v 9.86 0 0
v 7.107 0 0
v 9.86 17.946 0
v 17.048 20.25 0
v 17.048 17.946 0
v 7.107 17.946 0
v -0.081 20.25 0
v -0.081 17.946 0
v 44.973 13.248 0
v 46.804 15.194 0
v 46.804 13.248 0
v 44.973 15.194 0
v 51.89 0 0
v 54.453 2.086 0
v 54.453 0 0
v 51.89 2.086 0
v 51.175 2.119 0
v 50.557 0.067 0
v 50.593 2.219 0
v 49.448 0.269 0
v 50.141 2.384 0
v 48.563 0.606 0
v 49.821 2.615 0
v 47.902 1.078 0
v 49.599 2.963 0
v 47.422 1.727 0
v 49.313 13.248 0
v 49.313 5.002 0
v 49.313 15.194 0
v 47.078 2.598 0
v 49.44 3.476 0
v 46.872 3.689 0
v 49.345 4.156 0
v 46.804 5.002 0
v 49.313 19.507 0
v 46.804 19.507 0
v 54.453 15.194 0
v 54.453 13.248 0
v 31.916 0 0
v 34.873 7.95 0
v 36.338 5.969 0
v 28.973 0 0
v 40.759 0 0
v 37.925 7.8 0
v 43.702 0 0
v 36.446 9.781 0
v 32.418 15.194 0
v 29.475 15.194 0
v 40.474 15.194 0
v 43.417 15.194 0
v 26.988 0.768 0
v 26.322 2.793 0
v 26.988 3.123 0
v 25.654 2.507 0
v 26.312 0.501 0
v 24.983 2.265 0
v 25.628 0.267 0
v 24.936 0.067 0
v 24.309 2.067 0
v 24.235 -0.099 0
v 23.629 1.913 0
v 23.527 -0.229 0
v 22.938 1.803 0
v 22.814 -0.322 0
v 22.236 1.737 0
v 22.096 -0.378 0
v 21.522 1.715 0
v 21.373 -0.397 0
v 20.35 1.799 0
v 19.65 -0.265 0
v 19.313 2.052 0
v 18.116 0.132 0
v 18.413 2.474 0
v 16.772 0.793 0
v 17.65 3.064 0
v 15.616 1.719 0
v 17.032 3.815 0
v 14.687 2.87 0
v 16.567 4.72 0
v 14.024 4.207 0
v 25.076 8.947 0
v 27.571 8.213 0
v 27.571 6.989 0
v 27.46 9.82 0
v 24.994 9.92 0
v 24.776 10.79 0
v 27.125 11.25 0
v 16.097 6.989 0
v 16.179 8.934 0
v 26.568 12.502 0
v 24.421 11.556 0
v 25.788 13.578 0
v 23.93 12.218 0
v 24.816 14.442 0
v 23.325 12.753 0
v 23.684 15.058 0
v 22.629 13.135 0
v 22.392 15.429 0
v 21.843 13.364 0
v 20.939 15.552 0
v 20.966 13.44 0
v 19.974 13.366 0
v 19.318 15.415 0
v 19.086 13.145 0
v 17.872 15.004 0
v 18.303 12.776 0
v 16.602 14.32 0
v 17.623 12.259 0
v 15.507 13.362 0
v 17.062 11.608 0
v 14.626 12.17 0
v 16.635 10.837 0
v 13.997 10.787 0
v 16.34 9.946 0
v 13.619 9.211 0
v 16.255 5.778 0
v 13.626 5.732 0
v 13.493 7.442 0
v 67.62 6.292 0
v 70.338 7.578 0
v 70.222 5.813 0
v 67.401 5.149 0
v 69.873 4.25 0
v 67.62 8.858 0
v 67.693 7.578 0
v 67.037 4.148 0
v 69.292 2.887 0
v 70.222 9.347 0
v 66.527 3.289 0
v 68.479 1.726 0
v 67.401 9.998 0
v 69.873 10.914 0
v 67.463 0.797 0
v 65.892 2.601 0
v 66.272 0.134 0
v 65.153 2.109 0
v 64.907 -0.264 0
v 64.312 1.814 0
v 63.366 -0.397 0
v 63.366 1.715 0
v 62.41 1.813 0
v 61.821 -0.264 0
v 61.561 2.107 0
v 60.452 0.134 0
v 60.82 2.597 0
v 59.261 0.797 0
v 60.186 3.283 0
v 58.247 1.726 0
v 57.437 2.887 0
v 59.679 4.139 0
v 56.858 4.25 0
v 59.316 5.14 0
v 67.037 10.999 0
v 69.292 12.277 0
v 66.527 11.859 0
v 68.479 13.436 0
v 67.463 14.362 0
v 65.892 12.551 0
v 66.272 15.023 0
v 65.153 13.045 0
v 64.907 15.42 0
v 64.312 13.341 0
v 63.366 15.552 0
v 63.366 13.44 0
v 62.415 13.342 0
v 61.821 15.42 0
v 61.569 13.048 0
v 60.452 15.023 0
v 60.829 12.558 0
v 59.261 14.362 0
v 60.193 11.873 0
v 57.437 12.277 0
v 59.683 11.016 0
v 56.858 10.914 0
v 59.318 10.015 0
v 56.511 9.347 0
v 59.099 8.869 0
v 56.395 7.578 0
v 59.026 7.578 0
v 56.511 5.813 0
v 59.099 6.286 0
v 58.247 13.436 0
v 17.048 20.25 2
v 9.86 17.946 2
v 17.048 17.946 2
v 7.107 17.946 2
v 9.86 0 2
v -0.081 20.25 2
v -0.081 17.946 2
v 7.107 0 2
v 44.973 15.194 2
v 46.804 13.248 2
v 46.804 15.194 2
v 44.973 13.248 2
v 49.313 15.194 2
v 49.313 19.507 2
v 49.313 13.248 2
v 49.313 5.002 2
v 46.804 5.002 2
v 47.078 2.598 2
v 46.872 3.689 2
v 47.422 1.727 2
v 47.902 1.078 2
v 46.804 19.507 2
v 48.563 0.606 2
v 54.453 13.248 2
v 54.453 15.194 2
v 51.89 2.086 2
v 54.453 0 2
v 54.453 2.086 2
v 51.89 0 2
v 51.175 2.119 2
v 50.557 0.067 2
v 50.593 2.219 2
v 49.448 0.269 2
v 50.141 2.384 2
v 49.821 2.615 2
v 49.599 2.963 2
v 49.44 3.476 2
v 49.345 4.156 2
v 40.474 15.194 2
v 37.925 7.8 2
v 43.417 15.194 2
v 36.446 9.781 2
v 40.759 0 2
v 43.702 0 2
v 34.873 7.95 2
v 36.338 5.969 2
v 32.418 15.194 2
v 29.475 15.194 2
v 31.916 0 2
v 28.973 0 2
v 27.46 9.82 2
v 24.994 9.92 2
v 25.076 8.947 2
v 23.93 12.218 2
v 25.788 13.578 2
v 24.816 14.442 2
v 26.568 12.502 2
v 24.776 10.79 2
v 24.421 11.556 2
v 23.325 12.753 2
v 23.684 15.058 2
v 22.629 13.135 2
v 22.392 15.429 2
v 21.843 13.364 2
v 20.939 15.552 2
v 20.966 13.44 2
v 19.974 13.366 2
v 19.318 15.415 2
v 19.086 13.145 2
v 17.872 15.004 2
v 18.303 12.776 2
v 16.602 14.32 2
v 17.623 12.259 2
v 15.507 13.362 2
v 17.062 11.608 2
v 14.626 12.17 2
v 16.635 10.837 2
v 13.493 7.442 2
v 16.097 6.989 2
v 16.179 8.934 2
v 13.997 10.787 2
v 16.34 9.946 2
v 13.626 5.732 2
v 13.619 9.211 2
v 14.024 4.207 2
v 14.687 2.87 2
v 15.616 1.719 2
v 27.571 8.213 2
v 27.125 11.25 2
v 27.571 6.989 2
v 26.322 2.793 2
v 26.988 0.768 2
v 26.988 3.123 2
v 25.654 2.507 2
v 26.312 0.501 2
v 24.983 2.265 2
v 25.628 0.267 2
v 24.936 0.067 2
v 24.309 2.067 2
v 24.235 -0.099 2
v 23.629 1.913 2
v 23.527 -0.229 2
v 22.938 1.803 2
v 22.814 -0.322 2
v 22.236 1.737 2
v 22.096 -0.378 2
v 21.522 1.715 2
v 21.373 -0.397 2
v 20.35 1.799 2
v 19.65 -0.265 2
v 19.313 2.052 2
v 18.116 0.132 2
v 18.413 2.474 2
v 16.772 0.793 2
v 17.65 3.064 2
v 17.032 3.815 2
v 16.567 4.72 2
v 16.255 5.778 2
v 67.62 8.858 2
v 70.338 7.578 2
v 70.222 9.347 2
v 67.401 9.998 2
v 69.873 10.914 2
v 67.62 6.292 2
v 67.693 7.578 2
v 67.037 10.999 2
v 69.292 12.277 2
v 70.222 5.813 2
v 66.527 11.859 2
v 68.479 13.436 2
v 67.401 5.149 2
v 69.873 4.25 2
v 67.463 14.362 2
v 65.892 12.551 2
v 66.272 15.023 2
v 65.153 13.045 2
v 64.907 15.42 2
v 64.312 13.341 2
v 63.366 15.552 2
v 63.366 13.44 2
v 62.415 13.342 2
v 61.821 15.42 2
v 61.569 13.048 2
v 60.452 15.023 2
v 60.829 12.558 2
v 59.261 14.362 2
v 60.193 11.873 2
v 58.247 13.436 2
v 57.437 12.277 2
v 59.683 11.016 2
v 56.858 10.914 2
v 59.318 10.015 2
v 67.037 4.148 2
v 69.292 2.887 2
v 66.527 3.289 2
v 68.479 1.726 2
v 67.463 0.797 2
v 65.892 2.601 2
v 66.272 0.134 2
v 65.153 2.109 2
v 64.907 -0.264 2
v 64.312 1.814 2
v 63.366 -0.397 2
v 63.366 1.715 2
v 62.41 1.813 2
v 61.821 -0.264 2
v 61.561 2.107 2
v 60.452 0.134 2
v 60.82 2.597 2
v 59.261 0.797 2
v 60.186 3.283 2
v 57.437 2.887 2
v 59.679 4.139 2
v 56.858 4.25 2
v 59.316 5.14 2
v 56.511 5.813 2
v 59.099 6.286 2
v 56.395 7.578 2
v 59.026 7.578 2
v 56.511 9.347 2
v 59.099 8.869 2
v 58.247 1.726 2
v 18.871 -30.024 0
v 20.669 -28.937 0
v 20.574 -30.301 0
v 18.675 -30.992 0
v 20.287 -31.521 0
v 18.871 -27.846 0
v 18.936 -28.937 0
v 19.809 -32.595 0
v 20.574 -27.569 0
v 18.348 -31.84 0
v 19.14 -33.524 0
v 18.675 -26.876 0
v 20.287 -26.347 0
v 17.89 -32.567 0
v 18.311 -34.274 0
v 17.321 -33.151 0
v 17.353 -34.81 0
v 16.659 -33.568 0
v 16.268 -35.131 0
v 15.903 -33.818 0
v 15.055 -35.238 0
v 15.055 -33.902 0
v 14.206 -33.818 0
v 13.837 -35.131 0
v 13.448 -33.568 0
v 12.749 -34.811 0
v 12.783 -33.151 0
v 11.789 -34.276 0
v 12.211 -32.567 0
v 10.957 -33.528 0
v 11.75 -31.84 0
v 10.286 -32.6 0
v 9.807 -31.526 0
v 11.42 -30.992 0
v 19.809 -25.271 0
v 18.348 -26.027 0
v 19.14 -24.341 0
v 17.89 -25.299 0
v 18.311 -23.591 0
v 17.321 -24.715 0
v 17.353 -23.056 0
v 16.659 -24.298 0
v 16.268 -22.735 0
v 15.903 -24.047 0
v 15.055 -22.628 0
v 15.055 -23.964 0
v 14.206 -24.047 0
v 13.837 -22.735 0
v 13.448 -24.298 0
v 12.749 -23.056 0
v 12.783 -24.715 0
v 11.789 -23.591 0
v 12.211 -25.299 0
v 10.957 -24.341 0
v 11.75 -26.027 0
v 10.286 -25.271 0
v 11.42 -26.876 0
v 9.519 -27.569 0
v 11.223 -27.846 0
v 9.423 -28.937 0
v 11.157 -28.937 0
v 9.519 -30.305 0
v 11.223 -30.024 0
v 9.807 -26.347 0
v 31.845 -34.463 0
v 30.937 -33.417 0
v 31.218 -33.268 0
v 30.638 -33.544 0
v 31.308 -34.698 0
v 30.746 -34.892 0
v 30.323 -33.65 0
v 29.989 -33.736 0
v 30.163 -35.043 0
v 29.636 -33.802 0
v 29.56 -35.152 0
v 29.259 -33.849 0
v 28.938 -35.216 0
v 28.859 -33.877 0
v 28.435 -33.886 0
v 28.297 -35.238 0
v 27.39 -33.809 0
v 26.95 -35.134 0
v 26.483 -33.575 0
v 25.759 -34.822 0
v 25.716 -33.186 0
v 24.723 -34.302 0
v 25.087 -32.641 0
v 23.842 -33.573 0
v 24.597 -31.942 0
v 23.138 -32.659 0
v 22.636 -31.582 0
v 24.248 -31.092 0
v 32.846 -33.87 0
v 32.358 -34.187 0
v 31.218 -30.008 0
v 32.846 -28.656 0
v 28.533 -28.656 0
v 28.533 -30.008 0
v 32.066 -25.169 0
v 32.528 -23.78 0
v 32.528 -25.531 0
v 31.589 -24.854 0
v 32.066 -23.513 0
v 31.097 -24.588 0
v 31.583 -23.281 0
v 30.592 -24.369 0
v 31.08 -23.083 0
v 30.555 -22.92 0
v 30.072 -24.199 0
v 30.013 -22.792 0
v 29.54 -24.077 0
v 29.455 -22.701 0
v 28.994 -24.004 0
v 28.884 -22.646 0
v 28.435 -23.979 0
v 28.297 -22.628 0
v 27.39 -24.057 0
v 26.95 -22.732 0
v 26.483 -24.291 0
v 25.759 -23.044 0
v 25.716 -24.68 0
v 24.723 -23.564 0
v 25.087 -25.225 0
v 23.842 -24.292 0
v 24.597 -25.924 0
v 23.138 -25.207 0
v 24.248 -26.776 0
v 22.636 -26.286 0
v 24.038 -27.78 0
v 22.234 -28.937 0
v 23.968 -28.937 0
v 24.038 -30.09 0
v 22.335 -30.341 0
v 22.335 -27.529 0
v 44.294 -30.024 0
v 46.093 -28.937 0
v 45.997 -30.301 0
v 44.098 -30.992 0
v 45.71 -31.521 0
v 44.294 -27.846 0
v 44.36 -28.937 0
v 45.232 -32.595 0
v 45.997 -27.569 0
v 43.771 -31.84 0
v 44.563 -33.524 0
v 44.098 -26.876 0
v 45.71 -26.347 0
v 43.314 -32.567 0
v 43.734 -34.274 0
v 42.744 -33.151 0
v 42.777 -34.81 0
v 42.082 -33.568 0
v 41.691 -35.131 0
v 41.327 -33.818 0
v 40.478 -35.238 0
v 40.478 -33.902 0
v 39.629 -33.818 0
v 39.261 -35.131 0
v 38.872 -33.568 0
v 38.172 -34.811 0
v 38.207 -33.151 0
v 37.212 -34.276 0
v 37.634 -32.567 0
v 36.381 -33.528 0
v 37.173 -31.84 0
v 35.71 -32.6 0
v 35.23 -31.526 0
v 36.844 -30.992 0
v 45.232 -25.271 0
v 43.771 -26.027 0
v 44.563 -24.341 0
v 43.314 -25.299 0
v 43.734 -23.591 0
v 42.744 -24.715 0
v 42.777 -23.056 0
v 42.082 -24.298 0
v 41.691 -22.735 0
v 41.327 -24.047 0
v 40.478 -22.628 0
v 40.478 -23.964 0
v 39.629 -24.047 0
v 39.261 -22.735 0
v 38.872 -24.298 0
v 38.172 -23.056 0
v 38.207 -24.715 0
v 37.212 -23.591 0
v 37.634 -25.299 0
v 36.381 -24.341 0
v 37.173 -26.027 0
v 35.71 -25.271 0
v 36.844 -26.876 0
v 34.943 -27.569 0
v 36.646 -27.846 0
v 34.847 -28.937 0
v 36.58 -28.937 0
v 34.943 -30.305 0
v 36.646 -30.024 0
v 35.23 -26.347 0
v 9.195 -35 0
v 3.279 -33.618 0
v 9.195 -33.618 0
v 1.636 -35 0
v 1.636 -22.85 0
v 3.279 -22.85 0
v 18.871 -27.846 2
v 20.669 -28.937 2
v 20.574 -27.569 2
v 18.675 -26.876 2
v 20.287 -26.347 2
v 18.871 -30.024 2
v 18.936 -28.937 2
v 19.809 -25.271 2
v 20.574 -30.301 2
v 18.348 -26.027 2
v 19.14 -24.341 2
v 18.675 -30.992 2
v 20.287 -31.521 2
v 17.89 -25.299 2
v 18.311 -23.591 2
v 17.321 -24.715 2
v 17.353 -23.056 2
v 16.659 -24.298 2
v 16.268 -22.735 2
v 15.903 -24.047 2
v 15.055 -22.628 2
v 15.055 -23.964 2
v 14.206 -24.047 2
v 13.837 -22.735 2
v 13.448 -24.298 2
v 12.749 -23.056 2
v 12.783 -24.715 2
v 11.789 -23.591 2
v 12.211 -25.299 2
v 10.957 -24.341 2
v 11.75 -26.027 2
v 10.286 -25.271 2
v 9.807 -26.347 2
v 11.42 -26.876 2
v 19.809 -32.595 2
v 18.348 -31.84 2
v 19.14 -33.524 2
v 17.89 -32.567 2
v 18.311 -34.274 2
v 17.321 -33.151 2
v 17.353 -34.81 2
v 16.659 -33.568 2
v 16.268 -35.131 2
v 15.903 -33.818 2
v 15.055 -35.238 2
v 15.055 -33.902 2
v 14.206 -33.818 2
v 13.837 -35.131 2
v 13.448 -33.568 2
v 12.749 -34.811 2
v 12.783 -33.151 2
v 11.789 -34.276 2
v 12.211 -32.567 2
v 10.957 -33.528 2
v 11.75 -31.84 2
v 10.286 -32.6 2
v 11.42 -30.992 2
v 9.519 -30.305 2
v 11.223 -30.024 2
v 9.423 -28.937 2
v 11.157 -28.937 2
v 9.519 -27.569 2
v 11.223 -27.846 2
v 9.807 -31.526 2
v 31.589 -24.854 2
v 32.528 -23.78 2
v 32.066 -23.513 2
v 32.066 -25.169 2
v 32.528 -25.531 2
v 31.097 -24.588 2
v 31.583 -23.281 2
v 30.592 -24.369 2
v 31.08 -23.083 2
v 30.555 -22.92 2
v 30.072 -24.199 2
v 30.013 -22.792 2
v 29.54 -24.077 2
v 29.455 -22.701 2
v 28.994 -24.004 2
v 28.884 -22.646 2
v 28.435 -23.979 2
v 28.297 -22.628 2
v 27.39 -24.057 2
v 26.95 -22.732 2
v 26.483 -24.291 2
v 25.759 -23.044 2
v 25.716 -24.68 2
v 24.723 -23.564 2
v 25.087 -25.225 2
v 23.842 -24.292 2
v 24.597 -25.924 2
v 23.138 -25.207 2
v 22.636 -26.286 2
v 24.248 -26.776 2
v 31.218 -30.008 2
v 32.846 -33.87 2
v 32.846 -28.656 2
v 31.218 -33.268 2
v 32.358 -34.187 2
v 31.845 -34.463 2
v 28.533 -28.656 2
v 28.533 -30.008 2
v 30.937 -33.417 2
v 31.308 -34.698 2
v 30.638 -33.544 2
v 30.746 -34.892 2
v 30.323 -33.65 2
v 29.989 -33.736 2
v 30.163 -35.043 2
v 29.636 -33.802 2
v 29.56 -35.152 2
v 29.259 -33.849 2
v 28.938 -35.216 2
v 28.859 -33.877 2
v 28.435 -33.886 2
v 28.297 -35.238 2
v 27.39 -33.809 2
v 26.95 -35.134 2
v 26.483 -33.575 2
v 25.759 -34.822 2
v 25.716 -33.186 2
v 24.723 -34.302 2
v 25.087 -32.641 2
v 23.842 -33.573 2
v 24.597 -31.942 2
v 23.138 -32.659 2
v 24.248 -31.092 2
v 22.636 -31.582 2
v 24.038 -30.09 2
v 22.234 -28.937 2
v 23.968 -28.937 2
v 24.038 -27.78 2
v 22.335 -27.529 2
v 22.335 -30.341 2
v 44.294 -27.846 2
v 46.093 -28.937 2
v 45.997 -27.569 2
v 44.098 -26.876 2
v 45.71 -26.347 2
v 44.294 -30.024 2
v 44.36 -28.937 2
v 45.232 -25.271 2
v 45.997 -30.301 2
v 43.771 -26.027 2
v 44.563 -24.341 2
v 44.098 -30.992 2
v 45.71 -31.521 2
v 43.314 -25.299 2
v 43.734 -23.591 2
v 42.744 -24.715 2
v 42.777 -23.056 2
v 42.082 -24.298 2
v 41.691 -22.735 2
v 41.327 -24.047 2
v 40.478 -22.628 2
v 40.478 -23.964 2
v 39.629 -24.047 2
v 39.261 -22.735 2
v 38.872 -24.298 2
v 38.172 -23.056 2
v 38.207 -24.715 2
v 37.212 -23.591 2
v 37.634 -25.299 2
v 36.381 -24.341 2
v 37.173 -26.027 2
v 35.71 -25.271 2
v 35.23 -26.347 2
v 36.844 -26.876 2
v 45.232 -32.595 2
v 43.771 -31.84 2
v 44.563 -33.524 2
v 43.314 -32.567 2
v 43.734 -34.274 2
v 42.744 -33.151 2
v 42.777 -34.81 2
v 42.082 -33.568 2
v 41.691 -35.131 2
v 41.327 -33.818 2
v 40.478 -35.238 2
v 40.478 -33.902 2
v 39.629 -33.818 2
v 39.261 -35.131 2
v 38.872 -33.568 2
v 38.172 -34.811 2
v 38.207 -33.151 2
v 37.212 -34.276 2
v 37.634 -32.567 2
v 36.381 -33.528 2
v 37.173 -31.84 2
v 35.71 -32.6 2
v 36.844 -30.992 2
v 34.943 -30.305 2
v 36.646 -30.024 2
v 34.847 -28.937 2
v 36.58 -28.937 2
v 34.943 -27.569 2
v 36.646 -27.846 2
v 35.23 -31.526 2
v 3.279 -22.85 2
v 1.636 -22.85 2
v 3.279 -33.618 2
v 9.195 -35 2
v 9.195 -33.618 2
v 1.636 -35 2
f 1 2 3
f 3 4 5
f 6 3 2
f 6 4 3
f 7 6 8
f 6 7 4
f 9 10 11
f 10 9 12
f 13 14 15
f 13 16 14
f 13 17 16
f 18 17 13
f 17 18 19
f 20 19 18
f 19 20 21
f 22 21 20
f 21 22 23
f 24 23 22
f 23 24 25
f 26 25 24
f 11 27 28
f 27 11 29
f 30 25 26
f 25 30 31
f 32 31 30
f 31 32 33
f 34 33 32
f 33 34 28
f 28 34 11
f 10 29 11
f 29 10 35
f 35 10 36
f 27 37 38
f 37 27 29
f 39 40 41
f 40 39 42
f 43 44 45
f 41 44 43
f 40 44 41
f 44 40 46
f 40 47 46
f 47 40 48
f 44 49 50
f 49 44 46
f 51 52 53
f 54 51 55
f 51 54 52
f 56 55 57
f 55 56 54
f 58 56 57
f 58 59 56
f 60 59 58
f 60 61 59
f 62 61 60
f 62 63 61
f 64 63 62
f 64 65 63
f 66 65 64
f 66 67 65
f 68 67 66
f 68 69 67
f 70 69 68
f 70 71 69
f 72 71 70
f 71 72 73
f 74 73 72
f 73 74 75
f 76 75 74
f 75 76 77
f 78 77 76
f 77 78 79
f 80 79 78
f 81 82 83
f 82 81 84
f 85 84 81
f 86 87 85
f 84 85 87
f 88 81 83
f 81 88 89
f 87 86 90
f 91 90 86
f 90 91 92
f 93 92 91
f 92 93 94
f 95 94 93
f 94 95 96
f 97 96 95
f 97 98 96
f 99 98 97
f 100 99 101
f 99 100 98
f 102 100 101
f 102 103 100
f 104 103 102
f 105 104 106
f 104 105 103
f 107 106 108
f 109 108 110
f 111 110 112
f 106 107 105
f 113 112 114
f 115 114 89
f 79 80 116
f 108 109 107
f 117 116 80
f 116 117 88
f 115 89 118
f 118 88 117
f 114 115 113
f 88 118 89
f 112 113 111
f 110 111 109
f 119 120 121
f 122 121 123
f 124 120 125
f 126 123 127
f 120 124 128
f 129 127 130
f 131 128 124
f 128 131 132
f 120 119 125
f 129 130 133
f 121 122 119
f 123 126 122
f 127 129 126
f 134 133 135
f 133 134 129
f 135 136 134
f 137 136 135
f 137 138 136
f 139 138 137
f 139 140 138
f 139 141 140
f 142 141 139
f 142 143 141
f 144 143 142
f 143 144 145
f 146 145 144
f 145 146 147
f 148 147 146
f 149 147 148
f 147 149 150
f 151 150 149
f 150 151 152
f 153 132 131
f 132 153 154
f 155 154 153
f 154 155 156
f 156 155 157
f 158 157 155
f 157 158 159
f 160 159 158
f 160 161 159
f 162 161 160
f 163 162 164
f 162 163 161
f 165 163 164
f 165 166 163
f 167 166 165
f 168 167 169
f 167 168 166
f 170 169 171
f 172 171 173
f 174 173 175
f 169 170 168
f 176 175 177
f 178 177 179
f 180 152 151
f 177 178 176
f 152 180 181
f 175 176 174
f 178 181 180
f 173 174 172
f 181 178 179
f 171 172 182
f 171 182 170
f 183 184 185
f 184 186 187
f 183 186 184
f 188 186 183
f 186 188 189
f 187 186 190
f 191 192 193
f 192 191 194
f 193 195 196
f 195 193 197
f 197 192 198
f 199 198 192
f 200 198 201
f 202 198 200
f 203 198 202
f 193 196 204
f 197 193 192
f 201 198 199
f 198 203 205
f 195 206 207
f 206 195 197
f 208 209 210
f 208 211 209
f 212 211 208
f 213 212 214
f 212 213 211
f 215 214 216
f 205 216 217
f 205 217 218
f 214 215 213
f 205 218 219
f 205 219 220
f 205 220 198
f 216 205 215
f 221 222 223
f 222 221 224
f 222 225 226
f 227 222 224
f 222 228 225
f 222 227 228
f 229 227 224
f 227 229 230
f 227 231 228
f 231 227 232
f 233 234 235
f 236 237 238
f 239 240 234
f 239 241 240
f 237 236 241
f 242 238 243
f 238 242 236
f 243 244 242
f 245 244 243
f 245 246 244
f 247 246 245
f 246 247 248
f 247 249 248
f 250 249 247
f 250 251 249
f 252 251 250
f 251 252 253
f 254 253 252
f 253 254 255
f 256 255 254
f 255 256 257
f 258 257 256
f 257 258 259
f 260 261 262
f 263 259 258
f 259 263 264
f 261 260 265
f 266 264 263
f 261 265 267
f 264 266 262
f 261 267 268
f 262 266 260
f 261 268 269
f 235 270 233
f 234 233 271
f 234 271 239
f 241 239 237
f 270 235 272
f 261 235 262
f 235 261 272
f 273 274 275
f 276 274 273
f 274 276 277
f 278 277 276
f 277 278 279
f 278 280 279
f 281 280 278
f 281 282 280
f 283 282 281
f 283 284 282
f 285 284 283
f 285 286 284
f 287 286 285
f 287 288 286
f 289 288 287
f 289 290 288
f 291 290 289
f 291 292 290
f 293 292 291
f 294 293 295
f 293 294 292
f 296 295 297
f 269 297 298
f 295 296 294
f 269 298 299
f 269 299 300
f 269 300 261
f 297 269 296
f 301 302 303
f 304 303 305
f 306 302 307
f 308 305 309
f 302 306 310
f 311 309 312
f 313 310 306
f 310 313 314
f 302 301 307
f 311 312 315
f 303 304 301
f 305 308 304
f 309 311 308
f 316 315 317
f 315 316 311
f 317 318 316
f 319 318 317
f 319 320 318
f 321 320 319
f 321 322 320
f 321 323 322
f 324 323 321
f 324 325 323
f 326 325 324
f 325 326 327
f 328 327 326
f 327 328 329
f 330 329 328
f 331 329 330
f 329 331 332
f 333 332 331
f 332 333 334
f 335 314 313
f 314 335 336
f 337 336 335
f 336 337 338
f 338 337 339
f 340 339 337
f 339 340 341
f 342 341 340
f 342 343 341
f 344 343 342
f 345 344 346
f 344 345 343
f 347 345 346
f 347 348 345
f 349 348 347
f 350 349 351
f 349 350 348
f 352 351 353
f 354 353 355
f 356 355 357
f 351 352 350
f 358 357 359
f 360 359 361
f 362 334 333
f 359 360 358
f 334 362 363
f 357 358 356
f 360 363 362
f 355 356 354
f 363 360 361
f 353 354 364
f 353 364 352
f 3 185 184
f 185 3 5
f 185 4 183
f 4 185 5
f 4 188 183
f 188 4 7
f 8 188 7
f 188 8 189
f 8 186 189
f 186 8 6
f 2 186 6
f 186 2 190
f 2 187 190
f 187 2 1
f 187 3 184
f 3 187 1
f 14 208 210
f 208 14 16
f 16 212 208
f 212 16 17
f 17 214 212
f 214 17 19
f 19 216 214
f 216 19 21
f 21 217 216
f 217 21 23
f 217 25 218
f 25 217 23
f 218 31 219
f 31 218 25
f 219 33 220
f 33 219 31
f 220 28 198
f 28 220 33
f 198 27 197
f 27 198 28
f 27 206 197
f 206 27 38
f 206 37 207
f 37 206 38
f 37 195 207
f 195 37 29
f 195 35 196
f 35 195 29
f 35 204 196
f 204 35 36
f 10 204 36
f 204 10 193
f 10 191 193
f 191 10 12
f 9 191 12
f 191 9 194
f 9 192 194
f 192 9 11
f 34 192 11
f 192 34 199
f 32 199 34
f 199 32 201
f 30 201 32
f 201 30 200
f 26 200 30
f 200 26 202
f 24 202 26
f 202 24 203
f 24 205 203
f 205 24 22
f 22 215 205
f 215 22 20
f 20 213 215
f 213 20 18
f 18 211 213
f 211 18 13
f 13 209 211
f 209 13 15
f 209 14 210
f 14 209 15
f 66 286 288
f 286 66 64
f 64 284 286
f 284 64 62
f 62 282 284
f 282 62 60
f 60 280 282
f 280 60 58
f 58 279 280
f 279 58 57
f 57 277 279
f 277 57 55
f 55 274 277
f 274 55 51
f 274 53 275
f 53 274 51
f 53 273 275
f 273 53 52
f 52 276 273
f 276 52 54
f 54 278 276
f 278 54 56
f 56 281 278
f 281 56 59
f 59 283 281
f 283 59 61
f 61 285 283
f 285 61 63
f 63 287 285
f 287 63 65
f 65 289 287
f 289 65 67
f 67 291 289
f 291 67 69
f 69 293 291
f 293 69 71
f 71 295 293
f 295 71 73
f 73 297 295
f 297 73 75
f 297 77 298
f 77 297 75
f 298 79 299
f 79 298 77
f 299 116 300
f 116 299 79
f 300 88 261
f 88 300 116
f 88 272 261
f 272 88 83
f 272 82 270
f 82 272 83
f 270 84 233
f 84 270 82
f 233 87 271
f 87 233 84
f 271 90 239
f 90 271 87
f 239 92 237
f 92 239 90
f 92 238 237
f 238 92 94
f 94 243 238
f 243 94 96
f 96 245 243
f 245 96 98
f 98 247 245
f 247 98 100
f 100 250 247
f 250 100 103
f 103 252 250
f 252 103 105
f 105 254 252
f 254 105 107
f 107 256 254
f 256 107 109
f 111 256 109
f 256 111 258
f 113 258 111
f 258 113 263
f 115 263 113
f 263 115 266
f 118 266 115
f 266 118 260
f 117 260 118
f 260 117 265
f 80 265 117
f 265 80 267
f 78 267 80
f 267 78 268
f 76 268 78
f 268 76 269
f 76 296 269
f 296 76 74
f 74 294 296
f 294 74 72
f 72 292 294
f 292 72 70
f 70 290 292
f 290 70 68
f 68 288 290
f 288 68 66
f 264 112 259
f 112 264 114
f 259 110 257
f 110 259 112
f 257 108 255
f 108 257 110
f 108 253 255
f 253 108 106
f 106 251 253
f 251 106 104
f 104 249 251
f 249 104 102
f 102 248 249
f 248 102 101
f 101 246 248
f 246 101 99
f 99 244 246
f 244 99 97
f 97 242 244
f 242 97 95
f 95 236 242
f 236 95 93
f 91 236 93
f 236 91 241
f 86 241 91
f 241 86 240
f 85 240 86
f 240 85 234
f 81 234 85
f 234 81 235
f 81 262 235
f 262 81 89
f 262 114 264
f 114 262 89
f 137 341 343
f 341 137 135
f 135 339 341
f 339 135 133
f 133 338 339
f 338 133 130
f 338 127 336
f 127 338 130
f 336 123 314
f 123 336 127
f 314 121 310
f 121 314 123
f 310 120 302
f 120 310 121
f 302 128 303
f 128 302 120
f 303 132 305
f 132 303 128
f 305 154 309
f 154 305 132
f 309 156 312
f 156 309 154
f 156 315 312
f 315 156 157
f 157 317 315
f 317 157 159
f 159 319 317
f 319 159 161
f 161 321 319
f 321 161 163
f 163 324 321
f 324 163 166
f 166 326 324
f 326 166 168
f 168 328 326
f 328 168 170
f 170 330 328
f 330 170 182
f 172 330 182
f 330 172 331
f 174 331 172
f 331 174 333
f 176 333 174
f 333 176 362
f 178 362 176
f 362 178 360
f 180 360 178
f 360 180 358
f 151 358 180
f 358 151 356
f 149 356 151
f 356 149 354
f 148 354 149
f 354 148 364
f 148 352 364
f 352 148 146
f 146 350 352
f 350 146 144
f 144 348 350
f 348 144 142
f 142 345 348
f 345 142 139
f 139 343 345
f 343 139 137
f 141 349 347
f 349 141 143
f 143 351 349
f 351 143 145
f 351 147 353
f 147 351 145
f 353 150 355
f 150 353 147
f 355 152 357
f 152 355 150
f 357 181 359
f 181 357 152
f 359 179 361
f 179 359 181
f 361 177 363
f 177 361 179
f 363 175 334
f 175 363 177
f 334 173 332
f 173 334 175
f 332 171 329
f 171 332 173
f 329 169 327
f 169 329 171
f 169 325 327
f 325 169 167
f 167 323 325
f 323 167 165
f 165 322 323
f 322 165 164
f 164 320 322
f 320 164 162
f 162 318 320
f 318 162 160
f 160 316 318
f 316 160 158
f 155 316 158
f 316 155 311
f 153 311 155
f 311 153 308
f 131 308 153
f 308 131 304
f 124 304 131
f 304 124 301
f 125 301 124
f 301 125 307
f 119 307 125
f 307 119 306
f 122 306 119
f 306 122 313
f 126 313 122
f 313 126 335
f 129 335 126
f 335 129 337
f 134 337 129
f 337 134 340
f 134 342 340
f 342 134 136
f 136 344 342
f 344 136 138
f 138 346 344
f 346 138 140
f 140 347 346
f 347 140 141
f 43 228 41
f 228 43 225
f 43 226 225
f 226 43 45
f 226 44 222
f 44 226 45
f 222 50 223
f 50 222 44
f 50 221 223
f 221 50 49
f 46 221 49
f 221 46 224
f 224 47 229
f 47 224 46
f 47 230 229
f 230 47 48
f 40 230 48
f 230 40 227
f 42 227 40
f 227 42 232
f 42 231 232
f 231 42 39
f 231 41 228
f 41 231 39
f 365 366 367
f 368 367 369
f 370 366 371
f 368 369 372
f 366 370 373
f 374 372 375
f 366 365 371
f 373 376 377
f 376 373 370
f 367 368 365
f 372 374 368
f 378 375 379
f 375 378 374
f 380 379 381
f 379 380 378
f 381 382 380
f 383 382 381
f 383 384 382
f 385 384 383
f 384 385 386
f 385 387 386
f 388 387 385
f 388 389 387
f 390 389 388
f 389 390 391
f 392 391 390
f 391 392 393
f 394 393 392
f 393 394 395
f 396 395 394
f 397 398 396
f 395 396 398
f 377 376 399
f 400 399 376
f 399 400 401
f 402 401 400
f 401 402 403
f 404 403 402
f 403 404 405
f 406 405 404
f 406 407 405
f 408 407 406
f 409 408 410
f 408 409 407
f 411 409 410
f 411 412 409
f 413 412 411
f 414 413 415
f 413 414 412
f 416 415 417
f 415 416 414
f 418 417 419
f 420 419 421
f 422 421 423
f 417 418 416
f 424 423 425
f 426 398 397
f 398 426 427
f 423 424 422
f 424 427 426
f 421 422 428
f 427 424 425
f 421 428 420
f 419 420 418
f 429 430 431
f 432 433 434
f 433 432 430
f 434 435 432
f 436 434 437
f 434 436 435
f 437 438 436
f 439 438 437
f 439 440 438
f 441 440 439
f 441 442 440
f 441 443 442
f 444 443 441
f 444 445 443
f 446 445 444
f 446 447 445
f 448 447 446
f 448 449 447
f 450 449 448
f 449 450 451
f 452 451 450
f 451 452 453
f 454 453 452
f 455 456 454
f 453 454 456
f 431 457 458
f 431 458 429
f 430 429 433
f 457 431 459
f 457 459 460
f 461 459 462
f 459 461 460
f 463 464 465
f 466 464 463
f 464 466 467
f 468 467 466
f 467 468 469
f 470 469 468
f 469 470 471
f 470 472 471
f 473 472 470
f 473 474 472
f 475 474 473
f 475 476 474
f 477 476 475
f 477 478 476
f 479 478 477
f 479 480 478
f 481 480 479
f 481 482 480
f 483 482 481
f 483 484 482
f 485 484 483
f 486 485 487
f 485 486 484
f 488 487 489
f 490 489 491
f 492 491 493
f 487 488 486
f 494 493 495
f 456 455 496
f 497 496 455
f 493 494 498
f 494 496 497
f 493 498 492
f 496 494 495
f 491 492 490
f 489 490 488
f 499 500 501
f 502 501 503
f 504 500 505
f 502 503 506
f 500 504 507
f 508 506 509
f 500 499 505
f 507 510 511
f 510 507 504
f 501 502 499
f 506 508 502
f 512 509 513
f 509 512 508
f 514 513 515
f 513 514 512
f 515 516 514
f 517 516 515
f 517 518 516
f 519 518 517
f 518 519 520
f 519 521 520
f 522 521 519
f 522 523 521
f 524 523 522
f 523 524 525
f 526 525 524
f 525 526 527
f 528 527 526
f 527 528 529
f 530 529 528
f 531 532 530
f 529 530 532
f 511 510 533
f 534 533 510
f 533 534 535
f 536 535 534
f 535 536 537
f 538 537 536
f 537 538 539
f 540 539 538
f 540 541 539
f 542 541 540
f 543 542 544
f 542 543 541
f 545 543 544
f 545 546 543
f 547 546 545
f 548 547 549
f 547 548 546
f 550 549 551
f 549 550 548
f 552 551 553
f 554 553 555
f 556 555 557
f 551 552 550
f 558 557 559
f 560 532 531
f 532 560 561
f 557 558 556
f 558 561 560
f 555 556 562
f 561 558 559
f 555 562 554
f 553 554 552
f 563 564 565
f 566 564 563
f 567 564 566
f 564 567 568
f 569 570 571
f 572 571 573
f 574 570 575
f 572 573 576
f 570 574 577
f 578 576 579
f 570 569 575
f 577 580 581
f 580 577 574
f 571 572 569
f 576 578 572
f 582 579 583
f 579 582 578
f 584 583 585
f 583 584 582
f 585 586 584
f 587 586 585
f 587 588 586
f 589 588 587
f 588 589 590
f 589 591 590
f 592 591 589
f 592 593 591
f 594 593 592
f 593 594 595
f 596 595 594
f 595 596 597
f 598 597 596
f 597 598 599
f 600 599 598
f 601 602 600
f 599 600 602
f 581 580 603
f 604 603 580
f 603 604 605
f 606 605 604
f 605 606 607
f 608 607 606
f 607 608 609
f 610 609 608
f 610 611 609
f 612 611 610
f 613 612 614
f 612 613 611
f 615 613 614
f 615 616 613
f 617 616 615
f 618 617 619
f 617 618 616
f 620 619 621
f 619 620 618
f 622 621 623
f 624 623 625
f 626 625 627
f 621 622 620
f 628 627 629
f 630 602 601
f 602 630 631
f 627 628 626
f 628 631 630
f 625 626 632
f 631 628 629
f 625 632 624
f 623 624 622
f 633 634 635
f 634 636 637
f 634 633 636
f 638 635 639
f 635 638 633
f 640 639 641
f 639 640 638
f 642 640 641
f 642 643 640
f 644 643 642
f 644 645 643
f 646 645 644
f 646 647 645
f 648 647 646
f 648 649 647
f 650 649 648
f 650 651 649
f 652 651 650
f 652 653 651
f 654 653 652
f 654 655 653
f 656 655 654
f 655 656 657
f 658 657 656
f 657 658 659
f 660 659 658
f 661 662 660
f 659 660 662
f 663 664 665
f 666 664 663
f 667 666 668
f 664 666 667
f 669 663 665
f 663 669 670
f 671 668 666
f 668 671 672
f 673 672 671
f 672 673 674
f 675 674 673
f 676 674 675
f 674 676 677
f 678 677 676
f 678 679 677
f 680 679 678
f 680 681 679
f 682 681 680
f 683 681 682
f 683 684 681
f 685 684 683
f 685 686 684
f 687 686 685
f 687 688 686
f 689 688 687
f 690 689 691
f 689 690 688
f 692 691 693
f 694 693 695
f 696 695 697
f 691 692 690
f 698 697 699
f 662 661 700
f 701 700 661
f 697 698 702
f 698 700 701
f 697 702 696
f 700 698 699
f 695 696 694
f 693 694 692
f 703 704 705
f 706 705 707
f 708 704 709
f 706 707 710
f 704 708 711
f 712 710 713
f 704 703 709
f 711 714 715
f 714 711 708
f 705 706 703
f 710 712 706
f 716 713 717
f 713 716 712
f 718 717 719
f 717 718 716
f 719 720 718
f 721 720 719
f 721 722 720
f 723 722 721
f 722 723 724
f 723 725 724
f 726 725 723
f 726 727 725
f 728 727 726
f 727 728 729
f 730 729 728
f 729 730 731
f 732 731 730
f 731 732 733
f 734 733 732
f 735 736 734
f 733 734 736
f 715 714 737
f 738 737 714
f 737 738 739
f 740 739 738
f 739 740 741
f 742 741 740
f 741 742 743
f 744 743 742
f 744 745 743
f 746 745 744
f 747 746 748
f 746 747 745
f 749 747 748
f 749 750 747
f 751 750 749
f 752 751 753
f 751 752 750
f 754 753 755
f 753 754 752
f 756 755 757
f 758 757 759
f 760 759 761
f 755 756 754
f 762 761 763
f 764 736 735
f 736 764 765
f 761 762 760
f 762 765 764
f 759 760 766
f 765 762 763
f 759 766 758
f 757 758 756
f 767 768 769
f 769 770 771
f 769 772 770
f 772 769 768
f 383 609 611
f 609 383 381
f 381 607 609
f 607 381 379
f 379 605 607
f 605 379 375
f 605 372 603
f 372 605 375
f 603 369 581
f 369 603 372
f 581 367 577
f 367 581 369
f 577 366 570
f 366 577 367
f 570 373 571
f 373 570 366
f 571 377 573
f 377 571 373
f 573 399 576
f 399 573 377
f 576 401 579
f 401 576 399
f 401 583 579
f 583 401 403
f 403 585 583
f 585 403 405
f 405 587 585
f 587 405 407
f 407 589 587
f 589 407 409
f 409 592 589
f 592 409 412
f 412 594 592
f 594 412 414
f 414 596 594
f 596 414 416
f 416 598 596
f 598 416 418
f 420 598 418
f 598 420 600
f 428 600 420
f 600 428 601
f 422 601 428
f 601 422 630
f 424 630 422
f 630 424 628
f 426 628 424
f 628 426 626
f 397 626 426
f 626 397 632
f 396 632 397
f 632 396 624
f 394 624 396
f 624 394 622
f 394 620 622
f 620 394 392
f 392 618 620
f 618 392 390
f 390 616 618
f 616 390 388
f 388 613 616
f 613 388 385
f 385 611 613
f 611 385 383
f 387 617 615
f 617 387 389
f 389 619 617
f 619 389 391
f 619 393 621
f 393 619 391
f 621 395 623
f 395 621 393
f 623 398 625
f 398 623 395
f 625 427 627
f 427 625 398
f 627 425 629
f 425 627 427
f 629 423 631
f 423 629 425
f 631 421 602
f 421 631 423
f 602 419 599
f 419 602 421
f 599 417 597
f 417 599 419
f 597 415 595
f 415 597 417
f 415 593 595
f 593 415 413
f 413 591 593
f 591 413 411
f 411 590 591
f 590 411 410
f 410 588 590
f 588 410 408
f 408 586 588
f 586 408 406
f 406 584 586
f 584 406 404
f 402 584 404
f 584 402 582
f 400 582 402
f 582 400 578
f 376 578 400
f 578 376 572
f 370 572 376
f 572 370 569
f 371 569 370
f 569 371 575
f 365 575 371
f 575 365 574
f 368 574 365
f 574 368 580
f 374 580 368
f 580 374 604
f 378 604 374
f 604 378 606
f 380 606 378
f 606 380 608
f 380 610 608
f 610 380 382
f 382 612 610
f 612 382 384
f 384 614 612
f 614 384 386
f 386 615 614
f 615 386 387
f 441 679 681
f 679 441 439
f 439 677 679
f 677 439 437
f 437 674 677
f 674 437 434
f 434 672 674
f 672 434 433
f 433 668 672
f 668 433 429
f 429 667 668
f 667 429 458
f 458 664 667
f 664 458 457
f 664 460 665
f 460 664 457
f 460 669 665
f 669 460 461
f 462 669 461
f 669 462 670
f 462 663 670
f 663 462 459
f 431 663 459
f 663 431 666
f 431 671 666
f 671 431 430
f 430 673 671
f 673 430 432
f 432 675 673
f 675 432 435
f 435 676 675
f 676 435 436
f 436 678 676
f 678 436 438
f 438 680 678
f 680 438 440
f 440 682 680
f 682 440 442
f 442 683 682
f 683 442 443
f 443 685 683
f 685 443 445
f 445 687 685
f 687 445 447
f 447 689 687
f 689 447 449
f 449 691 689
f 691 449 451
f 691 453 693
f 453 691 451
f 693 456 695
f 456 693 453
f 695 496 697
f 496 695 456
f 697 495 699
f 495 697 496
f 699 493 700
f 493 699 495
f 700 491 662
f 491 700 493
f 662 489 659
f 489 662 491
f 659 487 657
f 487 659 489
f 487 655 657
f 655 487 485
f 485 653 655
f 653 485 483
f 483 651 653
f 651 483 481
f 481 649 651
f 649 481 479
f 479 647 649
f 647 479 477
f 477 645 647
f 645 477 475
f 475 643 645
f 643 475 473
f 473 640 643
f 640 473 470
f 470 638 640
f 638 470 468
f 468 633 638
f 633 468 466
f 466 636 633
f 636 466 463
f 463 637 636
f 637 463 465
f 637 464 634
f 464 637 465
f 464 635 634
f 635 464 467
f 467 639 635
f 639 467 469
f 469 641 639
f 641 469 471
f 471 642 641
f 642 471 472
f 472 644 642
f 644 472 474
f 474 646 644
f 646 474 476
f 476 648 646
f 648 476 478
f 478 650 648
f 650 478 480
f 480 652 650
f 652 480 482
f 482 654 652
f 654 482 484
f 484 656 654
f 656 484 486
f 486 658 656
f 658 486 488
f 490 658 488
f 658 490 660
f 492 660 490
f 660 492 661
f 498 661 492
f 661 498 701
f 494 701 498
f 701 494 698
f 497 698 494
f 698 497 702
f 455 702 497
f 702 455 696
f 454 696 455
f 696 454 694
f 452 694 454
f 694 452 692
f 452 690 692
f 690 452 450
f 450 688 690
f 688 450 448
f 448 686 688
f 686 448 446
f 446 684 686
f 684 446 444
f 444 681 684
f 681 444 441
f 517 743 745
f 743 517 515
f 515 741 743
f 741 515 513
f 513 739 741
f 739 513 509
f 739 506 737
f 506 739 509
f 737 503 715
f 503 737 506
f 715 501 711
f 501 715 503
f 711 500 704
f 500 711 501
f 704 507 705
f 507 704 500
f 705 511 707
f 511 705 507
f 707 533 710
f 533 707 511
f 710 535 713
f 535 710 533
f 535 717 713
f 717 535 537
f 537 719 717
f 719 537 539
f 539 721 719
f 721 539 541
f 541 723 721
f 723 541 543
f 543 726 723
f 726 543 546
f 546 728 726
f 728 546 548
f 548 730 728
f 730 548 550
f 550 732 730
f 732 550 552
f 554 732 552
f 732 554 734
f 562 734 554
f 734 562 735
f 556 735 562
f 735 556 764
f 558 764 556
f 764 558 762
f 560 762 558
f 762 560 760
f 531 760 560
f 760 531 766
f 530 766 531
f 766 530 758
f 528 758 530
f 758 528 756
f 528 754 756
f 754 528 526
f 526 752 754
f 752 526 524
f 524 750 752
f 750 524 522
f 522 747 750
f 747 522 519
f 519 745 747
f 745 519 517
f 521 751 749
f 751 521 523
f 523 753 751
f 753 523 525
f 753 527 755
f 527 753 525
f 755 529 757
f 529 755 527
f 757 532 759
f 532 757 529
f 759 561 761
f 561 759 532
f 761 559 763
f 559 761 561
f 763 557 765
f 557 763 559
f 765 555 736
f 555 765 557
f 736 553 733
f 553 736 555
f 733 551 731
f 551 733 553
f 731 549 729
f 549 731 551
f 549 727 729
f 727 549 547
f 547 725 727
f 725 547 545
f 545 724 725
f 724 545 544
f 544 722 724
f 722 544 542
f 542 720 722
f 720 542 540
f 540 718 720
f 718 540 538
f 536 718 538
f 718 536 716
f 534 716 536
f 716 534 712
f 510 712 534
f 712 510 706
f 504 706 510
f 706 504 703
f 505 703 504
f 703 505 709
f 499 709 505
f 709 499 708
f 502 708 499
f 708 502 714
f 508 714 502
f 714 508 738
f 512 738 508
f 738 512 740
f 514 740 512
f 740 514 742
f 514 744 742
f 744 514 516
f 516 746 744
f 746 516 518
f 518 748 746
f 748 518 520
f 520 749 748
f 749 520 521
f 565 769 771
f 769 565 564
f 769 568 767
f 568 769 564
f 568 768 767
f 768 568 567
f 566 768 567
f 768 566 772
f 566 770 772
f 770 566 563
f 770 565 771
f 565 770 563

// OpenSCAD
module Letras(escala=1,altura=1){

union(){
 linear_extrude(height=altura*2)
 text(size=20*escala,font = "Simplex","Texto");

 linear_extrude(height=altura*2)
 translate([0,-35*escala,0])
 text(size=12*escala,font = "Simplex","LOGO");
 }//fin union letras
 
}

Letras();
